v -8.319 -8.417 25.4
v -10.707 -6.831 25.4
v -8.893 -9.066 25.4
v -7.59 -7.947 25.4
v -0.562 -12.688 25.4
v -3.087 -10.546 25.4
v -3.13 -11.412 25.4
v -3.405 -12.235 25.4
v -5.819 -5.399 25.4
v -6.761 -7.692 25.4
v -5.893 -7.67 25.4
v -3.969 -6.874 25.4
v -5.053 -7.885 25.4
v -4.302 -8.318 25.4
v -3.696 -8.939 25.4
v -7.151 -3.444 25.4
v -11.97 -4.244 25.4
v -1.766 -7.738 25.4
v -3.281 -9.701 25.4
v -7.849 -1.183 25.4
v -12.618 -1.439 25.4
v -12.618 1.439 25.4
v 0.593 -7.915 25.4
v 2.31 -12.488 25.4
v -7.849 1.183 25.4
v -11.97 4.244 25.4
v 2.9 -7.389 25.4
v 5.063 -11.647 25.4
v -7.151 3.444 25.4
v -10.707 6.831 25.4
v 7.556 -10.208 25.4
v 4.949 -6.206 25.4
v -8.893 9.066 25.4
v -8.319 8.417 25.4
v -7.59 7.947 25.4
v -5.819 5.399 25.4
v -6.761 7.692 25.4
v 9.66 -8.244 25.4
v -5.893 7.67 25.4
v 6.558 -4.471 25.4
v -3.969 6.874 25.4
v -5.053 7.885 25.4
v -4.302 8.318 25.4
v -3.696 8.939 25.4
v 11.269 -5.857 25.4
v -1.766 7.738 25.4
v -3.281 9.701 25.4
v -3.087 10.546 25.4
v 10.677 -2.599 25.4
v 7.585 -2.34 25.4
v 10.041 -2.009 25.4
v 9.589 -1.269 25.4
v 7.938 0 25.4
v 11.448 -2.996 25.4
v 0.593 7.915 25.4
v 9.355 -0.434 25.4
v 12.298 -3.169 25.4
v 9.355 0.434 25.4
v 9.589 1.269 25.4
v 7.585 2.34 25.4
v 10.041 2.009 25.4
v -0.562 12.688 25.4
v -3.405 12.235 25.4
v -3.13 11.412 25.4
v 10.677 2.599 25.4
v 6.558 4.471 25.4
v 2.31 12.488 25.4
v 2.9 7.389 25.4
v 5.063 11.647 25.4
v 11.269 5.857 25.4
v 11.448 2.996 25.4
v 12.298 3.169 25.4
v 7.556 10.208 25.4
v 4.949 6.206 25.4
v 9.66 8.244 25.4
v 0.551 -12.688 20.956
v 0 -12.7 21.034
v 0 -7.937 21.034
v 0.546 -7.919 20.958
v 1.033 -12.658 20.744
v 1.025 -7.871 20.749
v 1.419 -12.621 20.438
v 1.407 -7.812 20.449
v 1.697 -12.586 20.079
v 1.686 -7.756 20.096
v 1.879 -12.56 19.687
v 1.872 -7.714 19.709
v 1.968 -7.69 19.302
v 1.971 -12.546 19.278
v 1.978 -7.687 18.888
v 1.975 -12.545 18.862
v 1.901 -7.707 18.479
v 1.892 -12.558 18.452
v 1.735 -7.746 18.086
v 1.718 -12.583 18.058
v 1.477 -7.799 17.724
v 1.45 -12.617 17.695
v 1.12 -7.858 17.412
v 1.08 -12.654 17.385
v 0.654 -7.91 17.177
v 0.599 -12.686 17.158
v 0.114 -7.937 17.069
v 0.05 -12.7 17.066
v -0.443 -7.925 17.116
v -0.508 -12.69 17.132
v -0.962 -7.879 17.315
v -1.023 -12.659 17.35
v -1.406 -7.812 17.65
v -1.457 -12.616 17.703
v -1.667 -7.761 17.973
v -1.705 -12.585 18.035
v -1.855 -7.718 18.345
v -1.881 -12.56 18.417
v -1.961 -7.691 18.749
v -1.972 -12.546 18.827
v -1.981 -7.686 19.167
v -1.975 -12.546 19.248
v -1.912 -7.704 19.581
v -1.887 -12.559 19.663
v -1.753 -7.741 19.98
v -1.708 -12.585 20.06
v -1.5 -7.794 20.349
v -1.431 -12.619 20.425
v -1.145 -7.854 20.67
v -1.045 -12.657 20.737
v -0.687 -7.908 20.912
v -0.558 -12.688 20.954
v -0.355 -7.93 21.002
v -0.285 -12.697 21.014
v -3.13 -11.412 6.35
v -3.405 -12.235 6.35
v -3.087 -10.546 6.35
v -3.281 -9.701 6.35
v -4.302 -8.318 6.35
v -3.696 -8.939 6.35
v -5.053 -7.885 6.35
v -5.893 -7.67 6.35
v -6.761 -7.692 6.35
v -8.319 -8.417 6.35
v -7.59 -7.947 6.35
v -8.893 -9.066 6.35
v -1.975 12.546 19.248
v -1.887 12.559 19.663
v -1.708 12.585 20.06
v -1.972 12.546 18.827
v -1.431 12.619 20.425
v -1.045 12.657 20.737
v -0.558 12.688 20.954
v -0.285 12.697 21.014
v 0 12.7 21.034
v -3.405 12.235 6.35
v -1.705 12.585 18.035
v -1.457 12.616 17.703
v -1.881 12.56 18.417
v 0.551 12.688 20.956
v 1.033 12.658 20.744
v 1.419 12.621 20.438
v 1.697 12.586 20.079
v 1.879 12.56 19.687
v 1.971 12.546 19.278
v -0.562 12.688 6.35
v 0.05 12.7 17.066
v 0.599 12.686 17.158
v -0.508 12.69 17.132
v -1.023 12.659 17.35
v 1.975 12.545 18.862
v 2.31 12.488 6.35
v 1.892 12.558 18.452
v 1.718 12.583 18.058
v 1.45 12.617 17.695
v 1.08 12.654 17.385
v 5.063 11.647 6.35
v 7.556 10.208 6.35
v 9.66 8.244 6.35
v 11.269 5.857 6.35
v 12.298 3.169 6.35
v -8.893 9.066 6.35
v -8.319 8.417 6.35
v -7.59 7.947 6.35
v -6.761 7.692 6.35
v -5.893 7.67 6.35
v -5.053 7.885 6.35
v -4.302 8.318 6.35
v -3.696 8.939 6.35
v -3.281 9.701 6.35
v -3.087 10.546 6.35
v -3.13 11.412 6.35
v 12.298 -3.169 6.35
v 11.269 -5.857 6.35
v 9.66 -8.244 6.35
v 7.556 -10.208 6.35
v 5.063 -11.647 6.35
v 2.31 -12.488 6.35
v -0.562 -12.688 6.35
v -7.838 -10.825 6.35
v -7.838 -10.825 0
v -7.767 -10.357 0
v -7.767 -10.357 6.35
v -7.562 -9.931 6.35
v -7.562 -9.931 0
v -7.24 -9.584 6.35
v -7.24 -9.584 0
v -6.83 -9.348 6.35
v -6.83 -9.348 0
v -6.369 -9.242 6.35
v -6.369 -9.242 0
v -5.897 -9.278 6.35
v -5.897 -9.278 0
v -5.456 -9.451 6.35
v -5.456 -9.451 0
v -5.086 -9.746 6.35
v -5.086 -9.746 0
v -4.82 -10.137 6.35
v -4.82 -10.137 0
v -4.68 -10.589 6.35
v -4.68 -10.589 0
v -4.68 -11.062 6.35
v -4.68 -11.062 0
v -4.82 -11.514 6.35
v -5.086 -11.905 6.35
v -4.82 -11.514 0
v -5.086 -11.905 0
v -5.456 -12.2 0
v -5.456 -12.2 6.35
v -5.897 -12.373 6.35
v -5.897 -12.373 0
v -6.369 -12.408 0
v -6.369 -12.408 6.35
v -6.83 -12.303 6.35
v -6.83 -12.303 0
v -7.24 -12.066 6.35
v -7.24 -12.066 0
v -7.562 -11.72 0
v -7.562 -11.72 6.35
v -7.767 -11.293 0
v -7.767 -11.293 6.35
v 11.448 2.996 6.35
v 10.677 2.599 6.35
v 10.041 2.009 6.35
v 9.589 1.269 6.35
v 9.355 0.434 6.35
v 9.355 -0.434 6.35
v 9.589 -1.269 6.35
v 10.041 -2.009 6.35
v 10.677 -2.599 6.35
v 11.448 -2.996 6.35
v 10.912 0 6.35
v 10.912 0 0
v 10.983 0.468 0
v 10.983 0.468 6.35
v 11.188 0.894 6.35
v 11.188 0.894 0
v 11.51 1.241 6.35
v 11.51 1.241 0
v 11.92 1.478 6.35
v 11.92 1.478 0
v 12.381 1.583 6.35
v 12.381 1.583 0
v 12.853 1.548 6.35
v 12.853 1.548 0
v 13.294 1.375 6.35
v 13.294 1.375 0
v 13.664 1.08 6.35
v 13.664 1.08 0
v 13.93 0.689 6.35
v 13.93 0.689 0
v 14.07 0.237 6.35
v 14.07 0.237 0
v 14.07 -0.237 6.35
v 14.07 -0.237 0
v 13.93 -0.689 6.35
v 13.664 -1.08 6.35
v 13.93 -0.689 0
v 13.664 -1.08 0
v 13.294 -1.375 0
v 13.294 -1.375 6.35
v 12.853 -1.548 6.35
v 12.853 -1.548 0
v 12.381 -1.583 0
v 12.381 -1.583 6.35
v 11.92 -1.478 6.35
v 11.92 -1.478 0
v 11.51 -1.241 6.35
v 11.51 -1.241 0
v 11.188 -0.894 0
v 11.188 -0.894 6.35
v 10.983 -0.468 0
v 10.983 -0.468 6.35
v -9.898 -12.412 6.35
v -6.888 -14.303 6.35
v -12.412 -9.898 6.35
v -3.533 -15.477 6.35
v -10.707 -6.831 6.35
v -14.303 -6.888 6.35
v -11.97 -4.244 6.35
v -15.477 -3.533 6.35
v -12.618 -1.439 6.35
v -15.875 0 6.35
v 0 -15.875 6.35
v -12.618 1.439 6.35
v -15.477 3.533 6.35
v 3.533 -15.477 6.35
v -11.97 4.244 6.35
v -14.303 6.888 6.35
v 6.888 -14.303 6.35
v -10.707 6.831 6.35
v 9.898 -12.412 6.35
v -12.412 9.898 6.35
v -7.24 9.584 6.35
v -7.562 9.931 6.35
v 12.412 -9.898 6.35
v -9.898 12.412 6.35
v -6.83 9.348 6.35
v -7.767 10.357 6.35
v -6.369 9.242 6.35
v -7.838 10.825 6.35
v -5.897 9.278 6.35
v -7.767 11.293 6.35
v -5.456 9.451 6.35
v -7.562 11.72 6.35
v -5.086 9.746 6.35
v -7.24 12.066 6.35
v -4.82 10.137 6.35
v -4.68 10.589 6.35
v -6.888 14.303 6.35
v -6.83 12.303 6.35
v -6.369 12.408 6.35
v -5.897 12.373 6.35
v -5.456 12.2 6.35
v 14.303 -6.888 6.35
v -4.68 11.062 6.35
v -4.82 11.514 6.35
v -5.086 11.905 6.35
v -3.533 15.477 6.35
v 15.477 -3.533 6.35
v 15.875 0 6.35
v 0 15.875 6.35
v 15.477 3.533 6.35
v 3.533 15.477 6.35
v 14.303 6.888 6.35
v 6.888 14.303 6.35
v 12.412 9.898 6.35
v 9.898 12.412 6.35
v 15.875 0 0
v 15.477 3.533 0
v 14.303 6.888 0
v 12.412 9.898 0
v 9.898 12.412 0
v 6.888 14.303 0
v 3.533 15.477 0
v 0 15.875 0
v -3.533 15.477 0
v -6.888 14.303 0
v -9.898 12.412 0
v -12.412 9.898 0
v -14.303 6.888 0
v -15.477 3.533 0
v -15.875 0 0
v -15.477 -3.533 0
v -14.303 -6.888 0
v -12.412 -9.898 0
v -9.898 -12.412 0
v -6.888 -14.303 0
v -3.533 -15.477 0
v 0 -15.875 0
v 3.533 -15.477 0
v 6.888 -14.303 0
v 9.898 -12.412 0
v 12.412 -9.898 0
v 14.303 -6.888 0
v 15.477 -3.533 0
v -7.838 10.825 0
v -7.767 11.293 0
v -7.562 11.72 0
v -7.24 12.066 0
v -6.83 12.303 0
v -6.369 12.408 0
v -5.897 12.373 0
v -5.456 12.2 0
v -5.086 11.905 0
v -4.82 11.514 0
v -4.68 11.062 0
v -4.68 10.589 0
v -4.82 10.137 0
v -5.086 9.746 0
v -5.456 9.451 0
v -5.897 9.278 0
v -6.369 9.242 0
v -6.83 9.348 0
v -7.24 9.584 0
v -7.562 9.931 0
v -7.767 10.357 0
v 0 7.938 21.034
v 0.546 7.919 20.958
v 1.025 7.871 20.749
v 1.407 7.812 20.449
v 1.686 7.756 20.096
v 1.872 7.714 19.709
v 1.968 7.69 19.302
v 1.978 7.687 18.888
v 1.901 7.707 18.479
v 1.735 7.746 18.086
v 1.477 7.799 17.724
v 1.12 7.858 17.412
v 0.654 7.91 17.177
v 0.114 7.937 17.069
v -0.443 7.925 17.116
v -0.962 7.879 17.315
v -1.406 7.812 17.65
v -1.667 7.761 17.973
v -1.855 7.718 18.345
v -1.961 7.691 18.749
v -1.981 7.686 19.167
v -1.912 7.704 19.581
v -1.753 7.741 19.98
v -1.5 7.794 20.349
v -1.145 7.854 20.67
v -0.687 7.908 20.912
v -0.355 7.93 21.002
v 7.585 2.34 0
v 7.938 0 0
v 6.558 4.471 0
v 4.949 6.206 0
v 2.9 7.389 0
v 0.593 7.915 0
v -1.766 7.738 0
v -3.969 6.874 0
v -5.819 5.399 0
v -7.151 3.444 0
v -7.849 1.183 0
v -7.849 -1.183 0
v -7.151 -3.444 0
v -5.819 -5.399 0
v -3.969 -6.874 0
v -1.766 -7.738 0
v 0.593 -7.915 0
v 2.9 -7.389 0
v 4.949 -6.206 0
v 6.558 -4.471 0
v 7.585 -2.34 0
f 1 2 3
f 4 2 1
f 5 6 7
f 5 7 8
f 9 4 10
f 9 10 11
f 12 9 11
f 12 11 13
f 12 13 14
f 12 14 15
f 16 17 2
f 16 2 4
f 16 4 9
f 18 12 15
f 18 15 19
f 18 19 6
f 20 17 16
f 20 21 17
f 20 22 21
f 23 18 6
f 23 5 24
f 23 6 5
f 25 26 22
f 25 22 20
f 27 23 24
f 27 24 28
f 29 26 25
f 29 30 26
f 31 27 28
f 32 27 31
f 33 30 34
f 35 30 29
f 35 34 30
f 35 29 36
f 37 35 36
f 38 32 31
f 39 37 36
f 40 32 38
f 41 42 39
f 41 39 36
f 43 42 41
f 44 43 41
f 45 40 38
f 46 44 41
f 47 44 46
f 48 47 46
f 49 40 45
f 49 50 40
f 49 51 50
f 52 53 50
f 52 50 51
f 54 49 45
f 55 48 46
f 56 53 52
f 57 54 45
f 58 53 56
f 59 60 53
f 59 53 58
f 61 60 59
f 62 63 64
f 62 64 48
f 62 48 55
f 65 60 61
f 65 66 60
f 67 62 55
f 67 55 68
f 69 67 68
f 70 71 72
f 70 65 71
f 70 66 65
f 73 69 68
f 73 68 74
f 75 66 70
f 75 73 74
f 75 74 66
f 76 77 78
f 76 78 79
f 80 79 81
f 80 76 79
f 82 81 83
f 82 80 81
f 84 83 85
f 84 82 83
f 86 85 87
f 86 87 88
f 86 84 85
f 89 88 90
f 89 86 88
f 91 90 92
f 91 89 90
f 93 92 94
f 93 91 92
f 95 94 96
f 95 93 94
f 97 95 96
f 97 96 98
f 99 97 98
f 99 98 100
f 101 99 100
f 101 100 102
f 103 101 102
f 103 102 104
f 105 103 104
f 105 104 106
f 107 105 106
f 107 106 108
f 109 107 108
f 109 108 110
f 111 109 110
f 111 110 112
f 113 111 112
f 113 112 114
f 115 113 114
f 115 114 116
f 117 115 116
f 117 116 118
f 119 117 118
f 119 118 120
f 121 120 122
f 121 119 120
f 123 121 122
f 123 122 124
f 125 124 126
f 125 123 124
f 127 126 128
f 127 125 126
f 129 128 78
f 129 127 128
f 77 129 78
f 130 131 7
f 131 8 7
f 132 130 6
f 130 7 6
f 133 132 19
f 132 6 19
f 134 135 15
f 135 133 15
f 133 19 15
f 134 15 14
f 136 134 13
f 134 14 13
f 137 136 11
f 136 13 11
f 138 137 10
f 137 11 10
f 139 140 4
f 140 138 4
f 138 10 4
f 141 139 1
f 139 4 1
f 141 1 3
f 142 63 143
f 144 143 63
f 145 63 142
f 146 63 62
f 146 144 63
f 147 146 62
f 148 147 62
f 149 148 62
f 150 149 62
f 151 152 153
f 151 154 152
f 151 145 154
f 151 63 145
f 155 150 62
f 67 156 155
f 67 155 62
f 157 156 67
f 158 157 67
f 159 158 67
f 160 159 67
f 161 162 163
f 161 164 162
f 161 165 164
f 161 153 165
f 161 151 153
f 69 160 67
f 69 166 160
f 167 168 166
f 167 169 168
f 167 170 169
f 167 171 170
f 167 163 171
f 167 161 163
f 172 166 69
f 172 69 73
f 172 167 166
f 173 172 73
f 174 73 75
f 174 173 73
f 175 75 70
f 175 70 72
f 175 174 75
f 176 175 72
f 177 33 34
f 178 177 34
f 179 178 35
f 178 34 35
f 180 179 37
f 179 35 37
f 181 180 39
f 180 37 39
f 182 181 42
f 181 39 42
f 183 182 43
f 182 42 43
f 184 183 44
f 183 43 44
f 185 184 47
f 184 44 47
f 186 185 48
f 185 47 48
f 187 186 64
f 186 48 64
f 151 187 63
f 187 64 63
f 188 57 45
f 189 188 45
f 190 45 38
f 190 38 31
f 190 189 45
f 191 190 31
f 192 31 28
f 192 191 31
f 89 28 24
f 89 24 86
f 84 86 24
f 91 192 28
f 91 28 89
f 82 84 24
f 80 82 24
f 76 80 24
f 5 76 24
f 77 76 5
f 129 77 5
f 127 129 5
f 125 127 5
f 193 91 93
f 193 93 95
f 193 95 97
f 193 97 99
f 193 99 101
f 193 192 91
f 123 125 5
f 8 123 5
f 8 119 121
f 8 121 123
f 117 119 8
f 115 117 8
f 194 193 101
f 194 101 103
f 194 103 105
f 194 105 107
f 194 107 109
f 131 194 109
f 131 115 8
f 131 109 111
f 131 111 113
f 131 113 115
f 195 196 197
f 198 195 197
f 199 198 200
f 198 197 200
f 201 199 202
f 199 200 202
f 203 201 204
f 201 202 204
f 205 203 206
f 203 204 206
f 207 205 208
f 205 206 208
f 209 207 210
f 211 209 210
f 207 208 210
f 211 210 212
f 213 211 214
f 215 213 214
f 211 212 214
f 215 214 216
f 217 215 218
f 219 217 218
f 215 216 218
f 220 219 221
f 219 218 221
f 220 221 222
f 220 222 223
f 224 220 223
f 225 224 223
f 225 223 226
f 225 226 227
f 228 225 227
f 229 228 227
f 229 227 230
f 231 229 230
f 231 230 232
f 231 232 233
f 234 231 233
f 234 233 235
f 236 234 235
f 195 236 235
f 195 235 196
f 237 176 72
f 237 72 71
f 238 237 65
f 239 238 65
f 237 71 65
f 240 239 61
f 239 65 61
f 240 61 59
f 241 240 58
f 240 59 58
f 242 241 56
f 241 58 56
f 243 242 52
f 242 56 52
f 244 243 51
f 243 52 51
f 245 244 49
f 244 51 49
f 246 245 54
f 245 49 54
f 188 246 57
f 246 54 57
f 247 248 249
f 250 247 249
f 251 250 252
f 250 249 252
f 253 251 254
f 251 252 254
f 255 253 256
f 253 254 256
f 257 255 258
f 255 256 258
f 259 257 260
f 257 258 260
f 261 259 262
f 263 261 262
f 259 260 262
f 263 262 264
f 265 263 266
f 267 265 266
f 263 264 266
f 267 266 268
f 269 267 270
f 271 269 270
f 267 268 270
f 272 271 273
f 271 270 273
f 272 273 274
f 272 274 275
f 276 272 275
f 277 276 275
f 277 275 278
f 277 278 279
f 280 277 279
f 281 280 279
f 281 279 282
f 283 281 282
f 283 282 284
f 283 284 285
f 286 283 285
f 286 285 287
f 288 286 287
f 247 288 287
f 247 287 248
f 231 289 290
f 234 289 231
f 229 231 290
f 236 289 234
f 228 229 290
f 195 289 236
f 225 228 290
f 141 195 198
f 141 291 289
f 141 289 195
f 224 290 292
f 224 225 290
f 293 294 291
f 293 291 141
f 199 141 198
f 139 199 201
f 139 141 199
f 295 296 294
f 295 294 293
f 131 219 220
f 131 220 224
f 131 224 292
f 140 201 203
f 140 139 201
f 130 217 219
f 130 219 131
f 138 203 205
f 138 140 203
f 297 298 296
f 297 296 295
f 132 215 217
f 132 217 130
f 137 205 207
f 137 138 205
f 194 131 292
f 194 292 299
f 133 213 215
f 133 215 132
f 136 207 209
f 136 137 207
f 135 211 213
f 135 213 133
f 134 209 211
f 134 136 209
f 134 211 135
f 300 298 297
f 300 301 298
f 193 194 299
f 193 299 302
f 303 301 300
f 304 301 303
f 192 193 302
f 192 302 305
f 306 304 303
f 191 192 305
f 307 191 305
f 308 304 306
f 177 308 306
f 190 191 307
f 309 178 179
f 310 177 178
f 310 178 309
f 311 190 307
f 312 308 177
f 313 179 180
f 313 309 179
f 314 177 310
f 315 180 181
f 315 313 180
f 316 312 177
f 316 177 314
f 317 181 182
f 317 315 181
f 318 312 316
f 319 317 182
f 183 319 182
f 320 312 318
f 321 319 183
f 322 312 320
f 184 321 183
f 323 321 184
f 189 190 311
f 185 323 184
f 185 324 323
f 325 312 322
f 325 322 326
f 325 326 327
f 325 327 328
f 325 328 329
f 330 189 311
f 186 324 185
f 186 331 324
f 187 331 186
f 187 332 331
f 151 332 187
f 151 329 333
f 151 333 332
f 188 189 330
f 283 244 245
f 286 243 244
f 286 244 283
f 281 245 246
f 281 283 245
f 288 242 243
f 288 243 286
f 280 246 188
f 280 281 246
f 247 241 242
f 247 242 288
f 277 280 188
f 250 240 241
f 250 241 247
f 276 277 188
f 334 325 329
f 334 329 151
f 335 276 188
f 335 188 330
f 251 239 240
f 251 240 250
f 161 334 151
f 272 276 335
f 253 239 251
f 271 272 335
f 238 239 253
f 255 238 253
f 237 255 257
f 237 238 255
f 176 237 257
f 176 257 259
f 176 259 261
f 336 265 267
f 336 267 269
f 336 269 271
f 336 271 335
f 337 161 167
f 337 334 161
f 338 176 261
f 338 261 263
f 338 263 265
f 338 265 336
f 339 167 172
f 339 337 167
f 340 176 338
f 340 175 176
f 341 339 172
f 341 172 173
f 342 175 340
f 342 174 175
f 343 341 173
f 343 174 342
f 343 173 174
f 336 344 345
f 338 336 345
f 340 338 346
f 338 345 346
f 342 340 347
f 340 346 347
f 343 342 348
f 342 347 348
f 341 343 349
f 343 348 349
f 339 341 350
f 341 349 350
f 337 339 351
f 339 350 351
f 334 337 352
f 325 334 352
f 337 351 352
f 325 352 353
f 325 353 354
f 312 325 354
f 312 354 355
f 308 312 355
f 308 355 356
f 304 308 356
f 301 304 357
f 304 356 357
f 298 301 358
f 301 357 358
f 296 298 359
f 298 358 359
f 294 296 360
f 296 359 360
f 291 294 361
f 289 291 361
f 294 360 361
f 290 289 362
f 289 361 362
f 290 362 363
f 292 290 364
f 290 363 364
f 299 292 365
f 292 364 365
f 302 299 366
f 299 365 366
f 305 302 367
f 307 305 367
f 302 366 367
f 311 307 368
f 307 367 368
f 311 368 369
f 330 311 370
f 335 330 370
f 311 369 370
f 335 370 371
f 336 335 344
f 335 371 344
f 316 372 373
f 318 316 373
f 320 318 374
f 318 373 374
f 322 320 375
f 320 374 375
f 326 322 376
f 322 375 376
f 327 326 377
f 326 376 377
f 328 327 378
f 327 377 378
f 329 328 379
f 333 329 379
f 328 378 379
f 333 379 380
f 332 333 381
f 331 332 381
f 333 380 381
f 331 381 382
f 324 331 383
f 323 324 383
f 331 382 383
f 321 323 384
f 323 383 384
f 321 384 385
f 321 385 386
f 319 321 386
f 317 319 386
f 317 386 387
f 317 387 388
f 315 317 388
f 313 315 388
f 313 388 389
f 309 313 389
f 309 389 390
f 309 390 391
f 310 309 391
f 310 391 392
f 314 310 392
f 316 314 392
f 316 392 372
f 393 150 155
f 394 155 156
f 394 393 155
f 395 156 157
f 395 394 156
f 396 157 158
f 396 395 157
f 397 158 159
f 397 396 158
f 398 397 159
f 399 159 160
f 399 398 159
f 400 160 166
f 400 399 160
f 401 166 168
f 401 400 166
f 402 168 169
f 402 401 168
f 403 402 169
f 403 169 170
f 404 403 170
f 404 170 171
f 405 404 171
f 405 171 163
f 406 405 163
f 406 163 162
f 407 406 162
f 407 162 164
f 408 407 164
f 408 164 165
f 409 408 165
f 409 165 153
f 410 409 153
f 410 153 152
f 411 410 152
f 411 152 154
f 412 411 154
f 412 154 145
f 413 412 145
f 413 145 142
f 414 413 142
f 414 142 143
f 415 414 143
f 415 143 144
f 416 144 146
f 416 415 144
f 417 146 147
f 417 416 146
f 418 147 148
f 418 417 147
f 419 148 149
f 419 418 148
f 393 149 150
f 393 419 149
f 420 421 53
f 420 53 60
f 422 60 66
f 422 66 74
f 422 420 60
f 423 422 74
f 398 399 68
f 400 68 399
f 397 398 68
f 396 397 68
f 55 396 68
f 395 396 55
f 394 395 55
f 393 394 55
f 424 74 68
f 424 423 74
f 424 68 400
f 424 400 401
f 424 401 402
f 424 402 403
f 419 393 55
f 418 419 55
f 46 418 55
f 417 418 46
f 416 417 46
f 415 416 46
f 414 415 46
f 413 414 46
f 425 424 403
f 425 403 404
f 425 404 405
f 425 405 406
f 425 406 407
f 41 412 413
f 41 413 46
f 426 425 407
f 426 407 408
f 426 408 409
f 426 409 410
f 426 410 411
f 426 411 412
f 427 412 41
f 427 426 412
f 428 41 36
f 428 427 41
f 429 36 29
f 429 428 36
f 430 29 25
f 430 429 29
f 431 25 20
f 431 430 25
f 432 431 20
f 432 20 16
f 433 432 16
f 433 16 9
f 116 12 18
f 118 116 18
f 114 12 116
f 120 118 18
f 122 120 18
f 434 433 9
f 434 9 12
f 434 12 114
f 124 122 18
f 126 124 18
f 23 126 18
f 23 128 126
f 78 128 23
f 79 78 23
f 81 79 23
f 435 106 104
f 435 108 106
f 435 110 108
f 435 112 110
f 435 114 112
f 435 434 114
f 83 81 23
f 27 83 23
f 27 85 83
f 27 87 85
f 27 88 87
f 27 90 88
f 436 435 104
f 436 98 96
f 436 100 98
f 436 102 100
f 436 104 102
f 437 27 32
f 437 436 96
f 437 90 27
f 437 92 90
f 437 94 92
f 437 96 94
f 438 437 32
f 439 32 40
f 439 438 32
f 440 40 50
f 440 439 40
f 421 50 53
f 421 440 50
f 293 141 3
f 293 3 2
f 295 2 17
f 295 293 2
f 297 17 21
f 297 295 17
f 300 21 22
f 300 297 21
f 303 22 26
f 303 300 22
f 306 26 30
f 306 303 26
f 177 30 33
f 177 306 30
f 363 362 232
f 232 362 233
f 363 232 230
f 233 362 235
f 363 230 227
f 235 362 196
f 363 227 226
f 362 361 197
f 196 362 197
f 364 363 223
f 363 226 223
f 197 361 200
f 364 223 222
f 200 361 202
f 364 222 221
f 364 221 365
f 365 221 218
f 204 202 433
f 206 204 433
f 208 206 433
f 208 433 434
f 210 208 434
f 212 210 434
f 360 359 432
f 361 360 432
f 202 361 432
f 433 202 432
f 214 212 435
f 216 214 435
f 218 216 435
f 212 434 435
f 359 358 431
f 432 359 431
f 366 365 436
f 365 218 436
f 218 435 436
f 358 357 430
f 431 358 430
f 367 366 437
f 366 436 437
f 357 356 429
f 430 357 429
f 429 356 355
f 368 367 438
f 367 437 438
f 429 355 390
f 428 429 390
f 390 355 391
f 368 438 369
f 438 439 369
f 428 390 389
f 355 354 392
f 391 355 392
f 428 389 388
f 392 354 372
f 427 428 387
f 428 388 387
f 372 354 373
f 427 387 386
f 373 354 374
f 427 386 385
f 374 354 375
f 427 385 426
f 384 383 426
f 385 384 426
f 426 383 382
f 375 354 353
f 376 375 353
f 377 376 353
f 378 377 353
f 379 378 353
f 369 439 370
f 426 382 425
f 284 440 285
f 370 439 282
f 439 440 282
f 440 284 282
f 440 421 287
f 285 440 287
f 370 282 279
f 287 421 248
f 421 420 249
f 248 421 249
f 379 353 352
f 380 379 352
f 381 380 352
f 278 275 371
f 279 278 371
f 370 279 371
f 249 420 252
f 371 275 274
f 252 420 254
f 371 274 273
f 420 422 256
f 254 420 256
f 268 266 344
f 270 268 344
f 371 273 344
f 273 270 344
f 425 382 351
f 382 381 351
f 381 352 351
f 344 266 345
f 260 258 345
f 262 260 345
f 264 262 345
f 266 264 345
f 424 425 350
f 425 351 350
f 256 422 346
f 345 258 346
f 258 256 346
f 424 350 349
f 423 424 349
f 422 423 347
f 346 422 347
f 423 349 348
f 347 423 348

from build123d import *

# Parameters (mm, degrees)
SKETCH1_R                           = 15.875
SKETCH1_R_2                         = 7.9375
BOSS_EXTRUDE1_DEPTH                 = 6.35
SKETCH2_R                           = 14.29
SKETCH2_R_2                         = 7.9375
BOSS_EXTRUDE2_DEPTH                 = 19.05
SKETCH3_R                           = 1.5875
CUT_EXTRUDE1_DEPTH                  = 14.8
CUT_EXTRUDE3_DEPTH                  = 34.89972345
CUT_EXTRUDE3_DEPTH_BACK             = 34.89972345
SKETCH4_R                           = 1.9844
SKETCH5_R                           = 3.175
CUT_EXTRUDE4_DEPTH                  = 19.05
CUT_START                           = -19.05
CUT_CHANGE_FROM_065_WT_TO_125_DEPTH = 19.05


# Read off the part's stored shape, not the designer's step: Cut- Change from .065 WT to .125
with BuildPart() as part:
    # Sketch1 → Boss-Extrude1 (new body)
    with BuildSketch(Plane.XY):
        Circle(SKETCH1_R)
        Circle(SKETCH1_R_2, mode=Mode.SUBTRACT)
    extrude(amount=BOSS_EXTRUDE1_DEPTH)

    # Sketch2 → Boss-Extrude2 (add)
    with BuildSketch(Plane.XY.offset(6.35)):
        Circle(SKETCH2_R)
        Circle(SKETCH2_R_2, mode=Mode.SUBTRACT)
    extrude(amount=BOSS_EXTRUDE2_DEPTH)

    # Sketch3 → Cut-Extrude1 (cut)
    with BuildSketch(Plane(origin=(0, 0, 0), x_dir=(-1, 0, 0), z_dir=(0, 0, -1))):
        with Locations((6.25, 10.825317547)):
            Circle(SKETCH3_R)
        with Locations((6.25, -10.825317547)):
            Circle(SKETCH3_R)
        with Locations((-12.5, 0)):
            Circle(SKETCH3_R)
    extrude(amount=-CUT_EXTRUDE1_DEPTH, mode=Mode.SUBTRACT)

    # Sketch4 → Cut-Extrude3 (cut, two sides: drawn at the far end of the back side and taken through both)
    with BuildSketch(Plane(origin=(0, 0, 0), x_dir=(1, 0, 0), z_dir=(0, 1, 0)).offset(-CUT_EXTRUDE3_DEPTH_BACK)):
        with Locations(Location((0, -19.05, 0), (0, 0, 270))):
            Circle(SKETCH4_R)
    extrude(amount=CUT_EXTRUDE3_DEPTH + CUT_EXTRUDE3_DEPTH_BACK, mode=Mode.SUBTRACT)

    # Sketch5 → Cut-Extrude4 (cut)
    with BuildSketch(Plane.XY.offset(25.4)):
        with Locations((-6.25, 10.825317547)):
            Circle(SKETCH5_R)
        with Locations((12.5, 0)):
            Circle(SKETCH5_R)
        with Locations((-6.25, -10.825317547)):
            Circle(SKETCH5_R)
    extrude(amount=-CUT_EXTRUDE4_DEPTH, mode=Mode.SUBTRACT)

    # Cut- Change from .065 WT to .125 outline → Cut- Change from .065 WT to .125 (cut)
    with BuildSketch(Plane.XY.offset(25.4).offset(CUT_START)):
        with BuildLine():
            ThreePointArc((-8.893268269, -9.066409404), (-12.7, 0), (-8.893268269, 9.066409404))
            ThreePointArc((-8.893268269, 9.066409404), (-9.276867733, 9.866830861), (-9.423910813, 10.742160164))
            ThreePointArc((-9.423910813, 10.742160164), (-14.29, 0), (-9.423910813, -10.742160164))
            ThreePointArc((-9.423910813, -10.742160164), (-9.276867733, -9.866830861), (-8.893268269, -9.066409404))
        make_face()
        with BuildLine():
            ThreePointArc((-4.591028187, 13.532426249), (-3.906492314, 12.967418555), (-3.405106731, 12.235000946))
            ThreePointArc((-3.405106731, 12.235000946), (6.35, 10.998522628), (12.298375, 3.168591542))
            ThreePointArc((12.298375, 3.168591542), (13.183360047, 3.100587694), (14.014939, 2.790266085))
            ThreePointArc((14.014939, 2.790266085), (7.145, 12.37550302), (-4.591028187, 13.532426249))
        make_face()
        with BuildLine():
            ThreePointArc((12.298375, -3.168591542), (6.35, -10.998522628), (-3.405106731, -12.235000946))
            ThreePointArc((-3.405106731, -12.235000946), (-3.906492314, -12.967418555), (-4.591028187, -13.532426249))
            ThreePointArc((-4.591028187, -13.532426249), (7.145, -12.37550302), (14.014939, -2.790266085))
            ThreePointArc((14.014939, -2.790266085), (13.183360047, -3.100587694), (12.298375, -3.168591542))
        make_face()
    extrude(amount=CUT_CHANGE_FROM_065_WT_TO_125_DEPTH, mode=Mode.SUBTRACT)


solid = part.part
